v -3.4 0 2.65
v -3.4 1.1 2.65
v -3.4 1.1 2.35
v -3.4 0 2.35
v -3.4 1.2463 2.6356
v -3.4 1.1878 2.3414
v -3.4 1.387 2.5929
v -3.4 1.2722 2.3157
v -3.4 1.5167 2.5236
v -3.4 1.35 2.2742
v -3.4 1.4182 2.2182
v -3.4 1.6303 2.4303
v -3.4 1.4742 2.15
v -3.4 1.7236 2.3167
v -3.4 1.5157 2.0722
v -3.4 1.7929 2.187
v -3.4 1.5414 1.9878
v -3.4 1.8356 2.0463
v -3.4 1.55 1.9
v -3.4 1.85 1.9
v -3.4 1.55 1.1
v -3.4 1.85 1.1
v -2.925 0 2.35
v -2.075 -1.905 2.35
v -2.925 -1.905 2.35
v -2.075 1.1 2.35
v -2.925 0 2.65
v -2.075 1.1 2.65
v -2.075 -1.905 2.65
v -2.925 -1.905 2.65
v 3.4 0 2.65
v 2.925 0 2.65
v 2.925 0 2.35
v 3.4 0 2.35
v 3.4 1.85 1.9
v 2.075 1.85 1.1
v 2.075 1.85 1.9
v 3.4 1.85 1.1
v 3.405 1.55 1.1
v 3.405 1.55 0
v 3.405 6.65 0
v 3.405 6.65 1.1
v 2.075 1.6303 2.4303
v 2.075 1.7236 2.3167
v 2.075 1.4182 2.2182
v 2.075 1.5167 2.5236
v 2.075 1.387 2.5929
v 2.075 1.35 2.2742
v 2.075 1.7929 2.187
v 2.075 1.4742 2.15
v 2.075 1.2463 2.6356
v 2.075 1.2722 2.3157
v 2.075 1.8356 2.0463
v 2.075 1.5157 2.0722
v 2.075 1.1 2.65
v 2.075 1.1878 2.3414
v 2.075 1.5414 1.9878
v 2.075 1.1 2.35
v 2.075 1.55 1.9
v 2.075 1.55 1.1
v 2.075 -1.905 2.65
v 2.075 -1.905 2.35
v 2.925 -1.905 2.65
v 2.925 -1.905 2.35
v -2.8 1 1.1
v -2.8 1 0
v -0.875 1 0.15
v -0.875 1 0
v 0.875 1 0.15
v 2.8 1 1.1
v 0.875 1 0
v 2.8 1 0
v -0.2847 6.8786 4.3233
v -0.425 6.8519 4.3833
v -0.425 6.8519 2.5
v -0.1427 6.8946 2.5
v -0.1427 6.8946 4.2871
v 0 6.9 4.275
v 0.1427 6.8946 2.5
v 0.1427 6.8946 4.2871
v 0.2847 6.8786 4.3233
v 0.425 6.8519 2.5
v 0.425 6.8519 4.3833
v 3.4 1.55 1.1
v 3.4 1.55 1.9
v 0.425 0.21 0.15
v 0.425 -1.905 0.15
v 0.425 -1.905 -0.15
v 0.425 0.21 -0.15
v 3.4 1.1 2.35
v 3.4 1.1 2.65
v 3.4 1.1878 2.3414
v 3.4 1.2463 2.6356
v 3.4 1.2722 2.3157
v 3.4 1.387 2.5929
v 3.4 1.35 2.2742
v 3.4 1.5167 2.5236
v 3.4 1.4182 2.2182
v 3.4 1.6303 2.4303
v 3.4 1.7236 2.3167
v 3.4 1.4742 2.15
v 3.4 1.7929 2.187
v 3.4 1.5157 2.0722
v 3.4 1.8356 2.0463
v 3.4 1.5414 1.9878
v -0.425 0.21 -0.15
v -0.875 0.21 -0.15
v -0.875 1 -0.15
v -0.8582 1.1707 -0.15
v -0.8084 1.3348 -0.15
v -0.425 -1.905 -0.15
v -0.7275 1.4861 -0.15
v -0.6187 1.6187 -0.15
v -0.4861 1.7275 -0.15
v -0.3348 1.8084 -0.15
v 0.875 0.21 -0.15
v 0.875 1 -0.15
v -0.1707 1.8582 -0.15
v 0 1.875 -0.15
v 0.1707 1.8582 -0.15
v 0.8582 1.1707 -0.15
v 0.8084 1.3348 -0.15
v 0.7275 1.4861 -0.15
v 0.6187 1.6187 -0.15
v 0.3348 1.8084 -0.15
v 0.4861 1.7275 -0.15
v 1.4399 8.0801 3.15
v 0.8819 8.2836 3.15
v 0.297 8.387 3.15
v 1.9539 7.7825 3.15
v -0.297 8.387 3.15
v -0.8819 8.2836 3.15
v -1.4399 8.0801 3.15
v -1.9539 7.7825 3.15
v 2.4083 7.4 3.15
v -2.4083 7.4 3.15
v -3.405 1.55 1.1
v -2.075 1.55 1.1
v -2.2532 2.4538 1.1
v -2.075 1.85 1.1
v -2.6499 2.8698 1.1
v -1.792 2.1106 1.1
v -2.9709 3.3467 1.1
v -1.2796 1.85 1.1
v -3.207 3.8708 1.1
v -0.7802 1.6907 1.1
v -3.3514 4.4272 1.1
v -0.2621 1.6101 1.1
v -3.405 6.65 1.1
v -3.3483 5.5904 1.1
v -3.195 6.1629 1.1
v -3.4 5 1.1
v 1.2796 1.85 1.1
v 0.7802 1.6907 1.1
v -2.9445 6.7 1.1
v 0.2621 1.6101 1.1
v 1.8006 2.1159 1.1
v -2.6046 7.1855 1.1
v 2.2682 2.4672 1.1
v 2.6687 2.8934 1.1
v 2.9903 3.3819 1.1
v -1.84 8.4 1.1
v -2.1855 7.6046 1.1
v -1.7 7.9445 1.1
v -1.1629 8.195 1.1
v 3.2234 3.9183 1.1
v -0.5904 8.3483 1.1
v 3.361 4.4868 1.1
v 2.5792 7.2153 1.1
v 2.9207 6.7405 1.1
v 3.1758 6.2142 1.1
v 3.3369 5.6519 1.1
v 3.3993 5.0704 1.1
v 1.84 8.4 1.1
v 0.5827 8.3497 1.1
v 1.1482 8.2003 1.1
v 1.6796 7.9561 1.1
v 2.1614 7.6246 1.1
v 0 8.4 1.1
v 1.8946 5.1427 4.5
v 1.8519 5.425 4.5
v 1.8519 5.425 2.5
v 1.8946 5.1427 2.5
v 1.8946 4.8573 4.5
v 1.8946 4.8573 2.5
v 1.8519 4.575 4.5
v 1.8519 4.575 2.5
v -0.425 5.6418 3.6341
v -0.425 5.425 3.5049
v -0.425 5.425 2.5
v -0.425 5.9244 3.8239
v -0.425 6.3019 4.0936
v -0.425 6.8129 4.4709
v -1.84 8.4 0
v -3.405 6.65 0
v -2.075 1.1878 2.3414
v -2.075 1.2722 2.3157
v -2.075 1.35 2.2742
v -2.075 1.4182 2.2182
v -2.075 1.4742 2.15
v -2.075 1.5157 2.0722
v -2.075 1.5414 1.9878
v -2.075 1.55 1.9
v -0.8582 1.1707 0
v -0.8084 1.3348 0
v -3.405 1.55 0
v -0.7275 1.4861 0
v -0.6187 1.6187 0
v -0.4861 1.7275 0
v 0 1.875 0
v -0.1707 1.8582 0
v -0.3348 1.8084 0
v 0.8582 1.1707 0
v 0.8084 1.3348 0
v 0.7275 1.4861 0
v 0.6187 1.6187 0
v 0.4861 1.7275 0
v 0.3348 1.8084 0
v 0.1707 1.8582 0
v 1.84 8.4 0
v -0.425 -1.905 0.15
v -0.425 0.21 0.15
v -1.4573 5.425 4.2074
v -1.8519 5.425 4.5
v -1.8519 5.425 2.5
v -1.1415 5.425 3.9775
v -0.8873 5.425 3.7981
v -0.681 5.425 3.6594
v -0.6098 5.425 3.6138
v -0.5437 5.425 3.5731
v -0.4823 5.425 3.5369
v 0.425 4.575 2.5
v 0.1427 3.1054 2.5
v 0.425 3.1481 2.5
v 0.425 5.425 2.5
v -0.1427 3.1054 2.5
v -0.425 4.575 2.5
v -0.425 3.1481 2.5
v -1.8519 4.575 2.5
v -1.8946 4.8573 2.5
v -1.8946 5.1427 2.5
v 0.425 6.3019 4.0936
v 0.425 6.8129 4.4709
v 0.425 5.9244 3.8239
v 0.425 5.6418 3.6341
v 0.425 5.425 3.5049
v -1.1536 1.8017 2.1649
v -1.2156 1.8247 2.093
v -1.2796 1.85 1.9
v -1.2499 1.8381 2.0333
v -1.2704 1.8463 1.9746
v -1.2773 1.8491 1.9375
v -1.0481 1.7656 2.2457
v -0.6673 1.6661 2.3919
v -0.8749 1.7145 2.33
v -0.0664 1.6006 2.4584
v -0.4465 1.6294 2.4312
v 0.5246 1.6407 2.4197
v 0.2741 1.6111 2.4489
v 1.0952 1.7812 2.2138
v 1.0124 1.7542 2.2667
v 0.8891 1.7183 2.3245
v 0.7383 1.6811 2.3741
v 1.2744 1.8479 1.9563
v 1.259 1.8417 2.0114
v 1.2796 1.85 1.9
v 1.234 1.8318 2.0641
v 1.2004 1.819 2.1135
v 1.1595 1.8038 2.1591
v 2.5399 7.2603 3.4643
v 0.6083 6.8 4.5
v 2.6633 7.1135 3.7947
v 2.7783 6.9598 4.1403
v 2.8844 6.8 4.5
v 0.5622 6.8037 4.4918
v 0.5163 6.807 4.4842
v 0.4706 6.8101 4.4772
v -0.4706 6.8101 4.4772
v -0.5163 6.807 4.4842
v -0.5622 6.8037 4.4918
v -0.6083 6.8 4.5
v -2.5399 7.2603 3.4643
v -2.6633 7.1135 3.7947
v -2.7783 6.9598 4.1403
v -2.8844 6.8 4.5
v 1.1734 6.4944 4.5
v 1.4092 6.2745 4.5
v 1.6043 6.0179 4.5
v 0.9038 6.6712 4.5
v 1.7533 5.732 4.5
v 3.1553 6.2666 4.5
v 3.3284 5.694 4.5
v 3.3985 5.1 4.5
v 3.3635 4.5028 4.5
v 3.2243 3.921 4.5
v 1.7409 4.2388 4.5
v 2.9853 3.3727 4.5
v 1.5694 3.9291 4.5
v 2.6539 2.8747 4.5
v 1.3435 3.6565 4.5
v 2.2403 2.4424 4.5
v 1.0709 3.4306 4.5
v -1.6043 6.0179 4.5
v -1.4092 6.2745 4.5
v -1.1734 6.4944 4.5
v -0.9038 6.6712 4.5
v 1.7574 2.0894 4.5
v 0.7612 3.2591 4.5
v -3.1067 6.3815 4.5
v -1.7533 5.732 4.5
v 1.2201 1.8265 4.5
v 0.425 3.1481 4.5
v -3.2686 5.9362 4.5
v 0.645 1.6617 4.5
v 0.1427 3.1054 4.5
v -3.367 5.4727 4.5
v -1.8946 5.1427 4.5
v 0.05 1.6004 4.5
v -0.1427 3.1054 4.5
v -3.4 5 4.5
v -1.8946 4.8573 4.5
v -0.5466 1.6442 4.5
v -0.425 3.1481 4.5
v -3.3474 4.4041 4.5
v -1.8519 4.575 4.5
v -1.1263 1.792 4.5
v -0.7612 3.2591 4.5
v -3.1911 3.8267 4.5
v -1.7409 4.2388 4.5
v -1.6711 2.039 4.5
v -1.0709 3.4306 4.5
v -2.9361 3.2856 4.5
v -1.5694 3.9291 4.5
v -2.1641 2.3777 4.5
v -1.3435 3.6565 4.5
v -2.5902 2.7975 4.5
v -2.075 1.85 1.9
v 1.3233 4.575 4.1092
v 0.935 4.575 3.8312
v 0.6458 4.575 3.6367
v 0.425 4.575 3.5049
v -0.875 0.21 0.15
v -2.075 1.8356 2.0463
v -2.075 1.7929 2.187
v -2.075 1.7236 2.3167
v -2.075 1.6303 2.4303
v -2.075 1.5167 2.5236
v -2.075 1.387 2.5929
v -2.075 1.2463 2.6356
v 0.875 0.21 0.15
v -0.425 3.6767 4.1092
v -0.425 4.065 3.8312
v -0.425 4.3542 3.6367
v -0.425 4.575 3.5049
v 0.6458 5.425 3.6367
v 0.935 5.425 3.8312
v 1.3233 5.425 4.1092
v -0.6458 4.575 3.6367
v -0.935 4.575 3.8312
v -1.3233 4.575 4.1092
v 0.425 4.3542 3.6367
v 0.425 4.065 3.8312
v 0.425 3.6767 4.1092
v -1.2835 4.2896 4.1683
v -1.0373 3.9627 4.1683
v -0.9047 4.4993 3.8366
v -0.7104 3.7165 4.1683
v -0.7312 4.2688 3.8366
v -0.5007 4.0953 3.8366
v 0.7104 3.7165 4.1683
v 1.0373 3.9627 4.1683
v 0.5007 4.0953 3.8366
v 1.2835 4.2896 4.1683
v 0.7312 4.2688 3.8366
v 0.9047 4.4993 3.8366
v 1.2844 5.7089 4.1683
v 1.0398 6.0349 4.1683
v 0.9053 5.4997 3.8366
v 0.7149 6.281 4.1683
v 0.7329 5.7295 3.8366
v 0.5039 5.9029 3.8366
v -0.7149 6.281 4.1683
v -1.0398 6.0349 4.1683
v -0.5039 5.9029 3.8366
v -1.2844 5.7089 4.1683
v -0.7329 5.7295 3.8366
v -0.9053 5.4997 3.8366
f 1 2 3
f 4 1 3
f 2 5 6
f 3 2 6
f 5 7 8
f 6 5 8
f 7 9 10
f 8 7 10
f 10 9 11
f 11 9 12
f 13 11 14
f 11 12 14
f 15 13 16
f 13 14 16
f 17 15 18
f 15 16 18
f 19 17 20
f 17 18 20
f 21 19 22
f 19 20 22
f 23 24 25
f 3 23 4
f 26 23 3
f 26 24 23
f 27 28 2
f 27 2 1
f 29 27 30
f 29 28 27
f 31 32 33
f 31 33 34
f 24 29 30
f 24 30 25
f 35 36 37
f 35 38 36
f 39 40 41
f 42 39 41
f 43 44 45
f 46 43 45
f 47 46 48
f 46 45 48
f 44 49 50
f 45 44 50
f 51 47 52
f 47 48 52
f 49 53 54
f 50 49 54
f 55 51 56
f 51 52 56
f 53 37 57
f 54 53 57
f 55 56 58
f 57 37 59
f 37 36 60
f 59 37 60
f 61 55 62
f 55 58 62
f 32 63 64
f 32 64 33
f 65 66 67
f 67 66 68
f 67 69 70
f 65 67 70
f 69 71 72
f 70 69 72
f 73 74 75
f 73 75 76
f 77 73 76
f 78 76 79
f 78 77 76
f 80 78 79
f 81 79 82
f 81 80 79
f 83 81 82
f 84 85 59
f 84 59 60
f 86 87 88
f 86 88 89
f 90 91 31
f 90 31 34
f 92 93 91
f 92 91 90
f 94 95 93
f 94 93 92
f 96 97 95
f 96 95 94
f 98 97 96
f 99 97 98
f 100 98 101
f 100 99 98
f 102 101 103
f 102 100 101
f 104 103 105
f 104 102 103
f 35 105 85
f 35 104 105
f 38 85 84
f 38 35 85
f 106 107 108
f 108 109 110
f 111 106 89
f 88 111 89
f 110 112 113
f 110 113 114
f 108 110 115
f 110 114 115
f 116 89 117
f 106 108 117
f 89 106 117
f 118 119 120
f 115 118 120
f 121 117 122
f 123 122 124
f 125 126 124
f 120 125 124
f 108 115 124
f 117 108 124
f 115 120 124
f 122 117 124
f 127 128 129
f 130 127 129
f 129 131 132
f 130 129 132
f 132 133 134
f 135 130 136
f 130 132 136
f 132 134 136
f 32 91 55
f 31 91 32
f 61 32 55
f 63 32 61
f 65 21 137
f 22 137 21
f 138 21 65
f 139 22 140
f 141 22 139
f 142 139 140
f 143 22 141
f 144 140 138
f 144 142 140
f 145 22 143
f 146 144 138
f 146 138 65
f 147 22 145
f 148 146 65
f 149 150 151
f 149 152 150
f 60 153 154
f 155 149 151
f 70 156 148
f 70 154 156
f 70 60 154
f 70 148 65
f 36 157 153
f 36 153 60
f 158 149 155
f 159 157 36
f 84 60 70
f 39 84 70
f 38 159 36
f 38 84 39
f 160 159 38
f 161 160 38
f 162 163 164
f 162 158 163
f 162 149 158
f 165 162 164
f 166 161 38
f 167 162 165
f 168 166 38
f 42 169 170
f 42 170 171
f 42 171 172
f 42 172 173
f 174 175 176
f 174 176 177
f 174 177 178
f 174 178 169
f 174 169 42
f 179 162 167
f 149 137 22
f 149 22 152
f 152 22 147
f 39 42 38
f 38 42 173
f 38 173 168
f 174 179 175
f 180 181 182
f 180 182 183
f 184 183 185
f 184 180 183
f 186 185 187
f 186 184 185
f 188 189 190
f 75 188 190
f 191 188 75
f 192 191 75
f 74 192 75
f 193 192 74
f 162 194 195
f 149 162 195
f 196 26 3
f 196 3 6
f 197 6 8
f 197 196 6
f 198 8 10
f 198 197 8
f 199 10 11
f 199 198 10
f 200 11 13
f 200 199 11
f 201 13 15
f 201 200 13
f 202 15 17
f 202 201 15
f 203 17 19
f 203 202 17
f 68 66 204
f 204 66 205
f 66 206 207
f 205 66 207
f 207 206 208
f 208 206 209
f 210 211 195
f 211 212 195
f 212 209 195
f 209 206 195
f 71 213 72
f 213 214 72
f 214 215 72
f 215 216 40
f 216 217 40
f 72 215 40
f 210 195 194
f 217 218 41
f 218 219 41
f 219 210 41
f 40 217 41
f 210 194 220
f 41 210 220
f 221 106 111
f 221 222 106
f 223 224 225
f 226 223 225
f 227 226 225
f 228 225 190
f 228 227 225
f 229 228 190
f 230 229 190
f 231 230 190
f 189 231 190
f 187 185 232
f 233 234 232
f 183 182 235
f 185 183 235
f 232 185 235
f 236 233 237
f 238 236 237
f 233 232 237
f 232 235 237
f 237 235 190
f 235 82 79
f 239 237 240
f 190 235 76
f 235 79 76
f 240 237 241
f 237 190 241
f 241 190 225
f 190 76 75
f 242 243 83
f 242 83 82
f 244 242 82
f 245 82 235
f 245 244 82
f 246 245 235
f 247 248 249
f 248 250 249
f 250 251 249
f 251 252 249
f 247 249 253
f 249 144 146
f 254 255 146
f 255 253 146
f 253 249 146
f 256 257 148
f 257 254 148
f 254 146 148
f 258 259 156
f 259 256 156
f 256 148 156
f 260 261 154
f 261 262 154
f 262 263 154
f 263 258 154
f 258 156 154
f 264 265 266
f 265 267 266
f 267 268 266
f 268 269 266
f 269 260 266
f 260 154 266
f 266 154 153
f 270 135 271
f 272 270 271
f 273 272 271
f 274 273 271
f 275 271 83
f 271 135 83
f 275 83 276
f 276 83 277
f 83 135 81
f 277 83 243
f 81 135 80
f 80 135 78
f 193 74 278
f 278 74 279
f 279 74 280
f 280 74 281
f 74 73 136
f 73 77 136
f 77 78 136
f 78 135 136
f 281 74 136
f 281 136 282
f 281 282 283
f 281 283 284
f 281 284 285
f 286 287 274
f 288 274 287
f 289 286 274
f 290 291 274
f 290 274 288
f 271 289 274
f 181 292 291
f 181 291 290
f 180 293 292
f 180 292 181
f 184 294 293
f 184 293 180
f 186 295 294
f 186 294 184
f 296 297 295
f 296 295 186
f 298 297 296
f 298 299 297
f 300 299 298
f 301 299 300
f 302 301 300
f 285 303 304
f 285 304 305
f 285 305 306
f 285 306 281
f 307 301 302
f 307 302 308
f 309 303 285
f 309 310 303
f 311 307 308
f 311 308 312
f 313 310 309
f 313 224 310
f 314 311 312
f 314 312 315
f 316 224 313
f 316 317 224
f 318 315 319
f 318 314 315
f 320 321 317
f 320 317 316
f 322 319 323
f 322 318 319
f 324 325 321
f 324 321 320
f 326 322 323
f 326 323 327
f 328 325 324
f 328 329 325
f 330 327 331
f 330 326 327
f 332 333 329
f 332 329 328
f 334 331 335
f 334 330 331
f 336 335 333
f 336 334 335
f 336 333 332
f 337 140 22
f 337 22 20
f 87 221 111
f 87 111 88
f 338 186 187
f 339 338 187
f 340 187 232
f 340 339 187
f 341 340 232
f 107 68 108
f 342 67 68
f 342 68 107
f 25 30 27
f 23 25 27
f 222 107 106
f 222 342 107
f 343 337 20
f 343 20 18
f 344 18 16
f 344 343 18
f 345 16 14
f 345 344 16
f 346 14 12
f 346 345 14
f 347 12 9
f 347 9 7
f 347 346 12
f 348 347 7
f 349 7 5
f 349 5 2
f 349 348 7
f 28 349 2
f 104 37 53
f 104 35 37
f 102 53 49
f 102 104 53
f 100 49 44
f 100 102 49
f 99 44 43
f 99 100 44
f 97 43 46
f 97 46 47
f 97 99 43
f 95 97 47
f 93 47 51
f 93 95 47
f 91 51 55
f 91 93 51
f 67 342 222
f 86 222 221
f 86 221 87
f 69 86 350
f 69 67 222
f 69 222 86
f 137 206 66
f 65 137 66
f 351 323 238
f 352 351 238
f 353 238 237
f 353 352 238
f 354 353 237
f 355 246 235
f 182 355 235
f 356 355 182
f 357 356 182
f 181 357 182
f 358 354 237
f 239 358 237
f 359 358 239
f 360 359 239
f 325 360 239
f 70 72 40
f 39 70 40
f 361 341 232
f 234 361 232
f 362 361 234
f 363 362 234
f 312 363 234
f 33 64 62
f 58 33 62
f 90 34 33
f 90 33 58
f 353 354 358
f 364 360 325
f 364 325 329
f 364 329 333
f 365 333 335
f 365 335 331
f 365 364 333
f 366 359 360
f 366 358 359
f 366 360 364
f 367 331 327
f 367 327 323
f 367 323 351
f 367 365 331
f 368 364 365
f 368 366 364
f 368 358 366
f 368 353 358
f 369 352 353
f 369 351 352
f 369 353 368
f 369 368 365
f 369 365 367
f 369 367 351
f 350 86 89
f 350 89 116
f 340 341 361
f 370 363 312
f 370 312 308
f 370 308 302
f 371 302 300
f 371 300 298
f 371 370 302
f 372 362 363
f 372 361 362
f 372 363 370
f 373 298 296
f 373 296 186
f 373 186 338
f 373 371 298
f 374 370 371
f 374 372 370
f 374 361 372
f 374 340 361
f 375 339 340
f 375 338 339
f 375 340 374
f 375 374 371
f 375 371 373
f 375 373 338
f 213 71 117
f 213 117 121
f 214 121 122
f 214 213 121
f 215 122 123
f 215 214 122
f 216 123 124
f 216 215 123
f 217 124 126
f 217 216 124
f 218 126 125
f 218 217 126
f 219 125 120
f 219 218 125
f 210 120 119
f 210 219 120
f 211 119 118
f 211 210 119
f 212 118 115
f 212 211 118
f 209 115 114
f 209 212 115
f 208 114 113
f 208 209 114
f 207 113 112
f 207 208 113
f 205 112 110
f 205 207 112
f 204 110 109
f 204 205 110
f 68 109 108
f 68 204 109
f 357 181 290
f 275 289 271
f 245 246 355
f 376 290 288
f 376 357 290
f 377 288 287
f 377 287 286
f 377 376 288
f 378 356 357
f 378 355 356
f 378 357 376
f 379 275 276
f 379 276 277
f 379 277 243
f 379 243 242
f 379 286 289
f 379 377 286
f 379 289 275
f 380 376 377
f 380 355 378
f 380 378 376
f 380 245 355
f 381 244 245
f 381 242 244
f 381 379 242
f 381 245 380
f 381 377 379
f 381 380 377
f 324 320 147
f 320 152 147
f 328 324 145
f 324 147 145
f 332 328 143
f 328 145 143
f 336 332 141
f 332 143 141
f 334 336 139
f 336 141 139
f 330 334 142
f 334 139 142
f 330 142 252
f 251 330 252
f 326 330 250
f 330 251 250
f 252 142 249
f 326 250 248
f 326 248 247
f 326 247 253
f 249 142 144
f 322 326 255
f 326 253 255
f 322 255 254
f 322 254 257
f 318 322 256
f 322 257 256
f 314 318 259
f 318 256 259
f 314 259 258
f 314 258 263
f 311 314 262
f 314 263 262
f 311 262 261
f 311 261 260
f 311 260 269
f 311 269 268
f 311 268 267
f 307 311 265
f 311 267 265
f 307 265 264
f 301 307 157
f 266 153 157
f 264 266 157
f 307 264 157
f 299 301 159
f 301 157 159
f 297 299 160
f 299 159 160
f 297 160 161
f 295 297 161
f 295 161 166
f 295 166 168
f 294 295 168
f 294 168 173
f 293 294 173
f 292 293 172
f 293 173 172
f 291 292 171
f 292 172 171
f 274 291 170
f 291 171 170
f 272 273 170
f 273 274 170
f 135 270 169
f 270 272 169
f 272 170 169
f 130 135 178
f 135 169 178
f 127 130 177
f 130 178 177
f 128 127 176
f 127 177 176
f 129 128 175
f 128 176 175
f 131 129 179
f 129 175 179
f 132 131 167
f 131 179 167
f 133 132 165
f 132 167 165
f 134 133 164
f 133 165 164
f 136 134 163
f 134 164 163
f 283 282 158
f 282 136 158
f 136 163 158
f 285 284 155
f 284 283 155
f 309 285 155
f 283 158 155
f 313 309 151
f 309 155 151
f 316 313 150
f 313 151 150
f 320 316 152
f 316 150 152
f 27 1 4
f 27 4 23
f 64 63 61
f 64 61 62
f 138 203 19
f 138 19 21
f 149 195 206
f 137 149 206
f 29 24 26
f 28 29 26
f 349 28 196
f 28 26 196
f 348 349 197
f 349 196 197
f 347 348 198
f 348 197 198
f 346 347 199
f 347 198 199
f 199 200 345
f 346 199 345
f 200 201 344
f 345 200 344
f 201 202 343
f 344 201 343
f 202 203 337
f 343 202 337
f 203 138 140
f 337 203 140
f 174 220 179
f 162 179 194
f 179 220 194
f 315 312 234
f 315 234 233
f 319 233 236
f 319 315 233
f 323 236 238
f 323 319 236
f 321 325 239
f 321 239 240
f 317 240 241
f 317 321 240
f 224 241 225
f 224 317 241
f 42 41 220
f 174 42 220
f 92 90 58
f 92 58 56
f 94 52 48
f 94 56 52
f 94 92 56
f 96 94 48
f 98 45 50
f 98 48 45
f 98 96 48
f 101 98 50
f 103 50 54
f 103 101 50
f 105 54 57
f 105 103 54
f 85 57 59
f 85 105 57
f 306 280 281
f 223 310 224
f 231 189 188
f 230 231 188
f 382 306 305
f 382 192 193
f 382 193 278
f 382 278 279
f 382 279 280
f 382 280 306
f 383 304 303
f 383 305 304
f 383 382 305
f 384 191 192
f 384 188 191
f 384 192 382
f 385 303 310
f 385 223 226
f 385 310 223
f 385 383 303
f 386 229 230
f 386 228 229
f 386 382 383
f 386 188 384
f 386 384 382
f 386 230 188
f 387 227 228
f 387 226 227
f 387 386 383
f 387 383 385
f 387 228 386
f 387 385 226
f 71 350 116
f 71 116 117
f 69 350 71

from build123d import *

# Parameters (mm, degrees)
BOSS_EXTRUDE1_DEPTH     = 1.1
SKETCH2_R               = 3.4
BOSS_EXTRUDE2_DEPTH     = 3.4
CUT_EXTRUDE1_DEPTH      = 11.119487388
CUT_EXTRUDE1_DEPTH_BACK = 11.119487388
CUT_EXTRUDE2_DEPTH      = 2
BOSS_EXTRUDE3_DEPTH     = 0.15
BOSS_EXTRUDE4_DEPTH     = 3.4
CUT_EXTRUDE3_START      = -3.4
CUT_EXTRUDE3_DEPTH      = 1.55
SKETCH10_W              = 0.475
SKETCH10_H              = 1.905
CUT_EXTRUDE4_DEPTH      = 10.486518065


with BuildPart() as part:
    # Sketch1 → Boss-Extrude1 (new body)
    with BuildSketch(Plane.XY):
        Polygon((-1.84, 8.4), (-3.405, 6.65), (-3.405, 1.55), (-2.8, 1), (2.8, 1), (3.405, 1.55), (3.405, 6.65), (1.84, 8.4), align=None)
    extrude(amount=BOSS_EXTRUDE1_DEPTH)

    # Sketch2 → Boss-Extrude2 (add)
    with BuildSketch(Plane.XY.offset(1.1)):
        with Locations(Location((0, 5, 0), (0, 0, 180))):
            Circle(SKETCH2_R)
    extrude(amount=BOSS_EXTRUDE2_DEPTH)

    # Sketch3 → Cut-Extrude1 (cut, two sides: drawn at the far end of the back side and taken through both)
    with BuildSketch(Plane(origin=(0, 0, 0), x_dir=(0, 0, -1), z_dir=(1, 0, 0)).offset(-CUT_EXTRUDE1_DEPTH_BACK)):
        Polygon((-3.15, 8.4), (-3.15, 7.4), (-4.5, 6.8), (-4.5, 8.4), align=None)
    extrude(amount=CUT_EXTRUDE1_DEPTH + CUT_EXTRUDE1_DEPTH_BACK, mode=Mode.SUBTRACT)

    # Sketch5 → Cut-Revolve1 (revolve, cut)
    with BuildSketch(Plane(origin=(0, 5, 0), x_dir=(-1, 0, 0), z_dir=(0, 1, 0)), mode=Mode.PRIVATE) as cut_revolve1_sk:
        Polygon((0, 4.5), (-1.9, 4.5), (-0.425, 3.37), (0, 3.37), align=None)
    revolve(cut_revolve1_sk.sketch.rotate(Axis((0, 5, 3.37), (0, 0, 1)), 148.034281249), axis=Axis((0, 5, 3.37), (0, 0, 1)), mode=Mode.SUBTRACT)

    # Sketch6 → Cut-Extrude2 (cut)
    with BuildSketch(Plane.XY.offset(4.5)):
        with BuildLine():
            Line((0.425, 5.425), (1.851857176, 5.425))
            ThreePointArc((1.851857176, 5.425), (1.9, 5), (1.851857176, 4.575))
            Line((1.851857176, 4.575), (0.425, 4.575))
            Line((0.425, 4.575), (0.425, 3.148142824))
            ThreePointArc((0.425, 3.148142824), (0, 3.1), (-0.425, 3.148142824))
            Line((-0.425, 3.148142824), (-0.425, 4.575))
            Line((-0.425, 4.575), (-1.851857176, 4.575))
            ThreePointArc((-1.851857176, 4.575), (-1.9, 5), (-1.851857176, 5.425))
            Line((-1.851857176, 5.425), (-0.425, 5.425))
            Line((-0.425, 5.425), (-0.425, 6.851857176))
            ThreePointArc((-0.425, 6.851857176), (0, 6.9), (0.425, 6.851857176))
            Line((0.425, 6.851857176), (0.425, 5.425))
        make_face()
    extrude(amount=-CUT_EXTRUDE2_DEPTH, mode=Mode.SUBTRACT)

    # Sketch7 → Boss-Extrude3 (add, symmetric)
    with BuildSketch(Plane.XY):
        with BuildLine():
            Line((-0.425, 0.21), (-0.425, -1.905))
            Line((-0.425, -1.905), (0.425, -1.905))
            Line((0.425, -1.905), (0.425, 0.21))
            Line((0.425, 0.21), (0.875, 0.21))
            Line((0.875, 0.21), (0.875, 1))
            ThreePointArc((0.875, 1), (0, 1.875), (-0.875, 1))
            Line((-0.875, 1), (-0.875, 0.21))
            Line((-0.875, 0.21), (-0.425, 0.21))
        make_face()
    extrude(amount=BOSS_EXTRUDE3_DEPTH, both=True)

    # Sketch8 → Boss-Extrude4 (add, symmetric)
    with BuildSketch(Plane(origin=(0, 0, 0), x_dir=(0, 0, -1), z_dir=(1, 0, 0))):
        with BuildLine():
            Line((0, 1.85), (-1.9, 1.85))
            ThreePointArc((-1.9, 1.85), (-2.430330086, 1.630330086), (-2.65, 1.1))
            Line((-2.65, 1.1), (-2.65, -1.905))
            Line((-2.65, -1.905), (-2.35, -1.905))
            Line((-2.35, -1.905), (-2.35, 1.1))
            ThreePointArc((-2.35, 1.1), (-2.218198052, 1.418198052), (-1.9, 1.55))
            Line((-1.9, 1.55), (0, 1.55))
            Line((0, 1.55), (0, 1.85))
        make_face()
    extrude(amount=BOSS_EXTRUDE4_DEPTH, both=True)

    # Sketch9 → Cut-Extrude3 (cut)
    with BuildSketch(Plane.XY.offset(4.5).offset(CUT_EXTRUDE3_START)):
        with BuildLine():
            Line((-2.075, -1.905), (-2.075, 2.306605302))
            ThreePointArc((-2.075, 2.306605302), (0, 1.6), (2.075, 2.306605302))
            Line((2.075, 2.306605302), (2.075, -1.905))
            Line((2.075, -1.905), (-2.075, -1.905))
        make_face()
    extrude(amount=CUT_EXTRUDE3_DEPTH, mode=Mode.SUBTRACT)

    # Sketch10 → Cut-Extrude4 (cut, through all)
    with BuildSketch(Plane.XY.offset(2.65)):
        with Locations((-3.1625, -0.9525)):
            Rectangle(SKETCH10_W, SKETCH10_H)
        with Locations((3.1625, -0.9525)):
            Rectangle(SKETCH10_W, SKETCH10_H)
    extrude(amount=-CUT_EXTRUDE4_DEPTH, mode=Mode.SUBTRACT)


solid = part.part
